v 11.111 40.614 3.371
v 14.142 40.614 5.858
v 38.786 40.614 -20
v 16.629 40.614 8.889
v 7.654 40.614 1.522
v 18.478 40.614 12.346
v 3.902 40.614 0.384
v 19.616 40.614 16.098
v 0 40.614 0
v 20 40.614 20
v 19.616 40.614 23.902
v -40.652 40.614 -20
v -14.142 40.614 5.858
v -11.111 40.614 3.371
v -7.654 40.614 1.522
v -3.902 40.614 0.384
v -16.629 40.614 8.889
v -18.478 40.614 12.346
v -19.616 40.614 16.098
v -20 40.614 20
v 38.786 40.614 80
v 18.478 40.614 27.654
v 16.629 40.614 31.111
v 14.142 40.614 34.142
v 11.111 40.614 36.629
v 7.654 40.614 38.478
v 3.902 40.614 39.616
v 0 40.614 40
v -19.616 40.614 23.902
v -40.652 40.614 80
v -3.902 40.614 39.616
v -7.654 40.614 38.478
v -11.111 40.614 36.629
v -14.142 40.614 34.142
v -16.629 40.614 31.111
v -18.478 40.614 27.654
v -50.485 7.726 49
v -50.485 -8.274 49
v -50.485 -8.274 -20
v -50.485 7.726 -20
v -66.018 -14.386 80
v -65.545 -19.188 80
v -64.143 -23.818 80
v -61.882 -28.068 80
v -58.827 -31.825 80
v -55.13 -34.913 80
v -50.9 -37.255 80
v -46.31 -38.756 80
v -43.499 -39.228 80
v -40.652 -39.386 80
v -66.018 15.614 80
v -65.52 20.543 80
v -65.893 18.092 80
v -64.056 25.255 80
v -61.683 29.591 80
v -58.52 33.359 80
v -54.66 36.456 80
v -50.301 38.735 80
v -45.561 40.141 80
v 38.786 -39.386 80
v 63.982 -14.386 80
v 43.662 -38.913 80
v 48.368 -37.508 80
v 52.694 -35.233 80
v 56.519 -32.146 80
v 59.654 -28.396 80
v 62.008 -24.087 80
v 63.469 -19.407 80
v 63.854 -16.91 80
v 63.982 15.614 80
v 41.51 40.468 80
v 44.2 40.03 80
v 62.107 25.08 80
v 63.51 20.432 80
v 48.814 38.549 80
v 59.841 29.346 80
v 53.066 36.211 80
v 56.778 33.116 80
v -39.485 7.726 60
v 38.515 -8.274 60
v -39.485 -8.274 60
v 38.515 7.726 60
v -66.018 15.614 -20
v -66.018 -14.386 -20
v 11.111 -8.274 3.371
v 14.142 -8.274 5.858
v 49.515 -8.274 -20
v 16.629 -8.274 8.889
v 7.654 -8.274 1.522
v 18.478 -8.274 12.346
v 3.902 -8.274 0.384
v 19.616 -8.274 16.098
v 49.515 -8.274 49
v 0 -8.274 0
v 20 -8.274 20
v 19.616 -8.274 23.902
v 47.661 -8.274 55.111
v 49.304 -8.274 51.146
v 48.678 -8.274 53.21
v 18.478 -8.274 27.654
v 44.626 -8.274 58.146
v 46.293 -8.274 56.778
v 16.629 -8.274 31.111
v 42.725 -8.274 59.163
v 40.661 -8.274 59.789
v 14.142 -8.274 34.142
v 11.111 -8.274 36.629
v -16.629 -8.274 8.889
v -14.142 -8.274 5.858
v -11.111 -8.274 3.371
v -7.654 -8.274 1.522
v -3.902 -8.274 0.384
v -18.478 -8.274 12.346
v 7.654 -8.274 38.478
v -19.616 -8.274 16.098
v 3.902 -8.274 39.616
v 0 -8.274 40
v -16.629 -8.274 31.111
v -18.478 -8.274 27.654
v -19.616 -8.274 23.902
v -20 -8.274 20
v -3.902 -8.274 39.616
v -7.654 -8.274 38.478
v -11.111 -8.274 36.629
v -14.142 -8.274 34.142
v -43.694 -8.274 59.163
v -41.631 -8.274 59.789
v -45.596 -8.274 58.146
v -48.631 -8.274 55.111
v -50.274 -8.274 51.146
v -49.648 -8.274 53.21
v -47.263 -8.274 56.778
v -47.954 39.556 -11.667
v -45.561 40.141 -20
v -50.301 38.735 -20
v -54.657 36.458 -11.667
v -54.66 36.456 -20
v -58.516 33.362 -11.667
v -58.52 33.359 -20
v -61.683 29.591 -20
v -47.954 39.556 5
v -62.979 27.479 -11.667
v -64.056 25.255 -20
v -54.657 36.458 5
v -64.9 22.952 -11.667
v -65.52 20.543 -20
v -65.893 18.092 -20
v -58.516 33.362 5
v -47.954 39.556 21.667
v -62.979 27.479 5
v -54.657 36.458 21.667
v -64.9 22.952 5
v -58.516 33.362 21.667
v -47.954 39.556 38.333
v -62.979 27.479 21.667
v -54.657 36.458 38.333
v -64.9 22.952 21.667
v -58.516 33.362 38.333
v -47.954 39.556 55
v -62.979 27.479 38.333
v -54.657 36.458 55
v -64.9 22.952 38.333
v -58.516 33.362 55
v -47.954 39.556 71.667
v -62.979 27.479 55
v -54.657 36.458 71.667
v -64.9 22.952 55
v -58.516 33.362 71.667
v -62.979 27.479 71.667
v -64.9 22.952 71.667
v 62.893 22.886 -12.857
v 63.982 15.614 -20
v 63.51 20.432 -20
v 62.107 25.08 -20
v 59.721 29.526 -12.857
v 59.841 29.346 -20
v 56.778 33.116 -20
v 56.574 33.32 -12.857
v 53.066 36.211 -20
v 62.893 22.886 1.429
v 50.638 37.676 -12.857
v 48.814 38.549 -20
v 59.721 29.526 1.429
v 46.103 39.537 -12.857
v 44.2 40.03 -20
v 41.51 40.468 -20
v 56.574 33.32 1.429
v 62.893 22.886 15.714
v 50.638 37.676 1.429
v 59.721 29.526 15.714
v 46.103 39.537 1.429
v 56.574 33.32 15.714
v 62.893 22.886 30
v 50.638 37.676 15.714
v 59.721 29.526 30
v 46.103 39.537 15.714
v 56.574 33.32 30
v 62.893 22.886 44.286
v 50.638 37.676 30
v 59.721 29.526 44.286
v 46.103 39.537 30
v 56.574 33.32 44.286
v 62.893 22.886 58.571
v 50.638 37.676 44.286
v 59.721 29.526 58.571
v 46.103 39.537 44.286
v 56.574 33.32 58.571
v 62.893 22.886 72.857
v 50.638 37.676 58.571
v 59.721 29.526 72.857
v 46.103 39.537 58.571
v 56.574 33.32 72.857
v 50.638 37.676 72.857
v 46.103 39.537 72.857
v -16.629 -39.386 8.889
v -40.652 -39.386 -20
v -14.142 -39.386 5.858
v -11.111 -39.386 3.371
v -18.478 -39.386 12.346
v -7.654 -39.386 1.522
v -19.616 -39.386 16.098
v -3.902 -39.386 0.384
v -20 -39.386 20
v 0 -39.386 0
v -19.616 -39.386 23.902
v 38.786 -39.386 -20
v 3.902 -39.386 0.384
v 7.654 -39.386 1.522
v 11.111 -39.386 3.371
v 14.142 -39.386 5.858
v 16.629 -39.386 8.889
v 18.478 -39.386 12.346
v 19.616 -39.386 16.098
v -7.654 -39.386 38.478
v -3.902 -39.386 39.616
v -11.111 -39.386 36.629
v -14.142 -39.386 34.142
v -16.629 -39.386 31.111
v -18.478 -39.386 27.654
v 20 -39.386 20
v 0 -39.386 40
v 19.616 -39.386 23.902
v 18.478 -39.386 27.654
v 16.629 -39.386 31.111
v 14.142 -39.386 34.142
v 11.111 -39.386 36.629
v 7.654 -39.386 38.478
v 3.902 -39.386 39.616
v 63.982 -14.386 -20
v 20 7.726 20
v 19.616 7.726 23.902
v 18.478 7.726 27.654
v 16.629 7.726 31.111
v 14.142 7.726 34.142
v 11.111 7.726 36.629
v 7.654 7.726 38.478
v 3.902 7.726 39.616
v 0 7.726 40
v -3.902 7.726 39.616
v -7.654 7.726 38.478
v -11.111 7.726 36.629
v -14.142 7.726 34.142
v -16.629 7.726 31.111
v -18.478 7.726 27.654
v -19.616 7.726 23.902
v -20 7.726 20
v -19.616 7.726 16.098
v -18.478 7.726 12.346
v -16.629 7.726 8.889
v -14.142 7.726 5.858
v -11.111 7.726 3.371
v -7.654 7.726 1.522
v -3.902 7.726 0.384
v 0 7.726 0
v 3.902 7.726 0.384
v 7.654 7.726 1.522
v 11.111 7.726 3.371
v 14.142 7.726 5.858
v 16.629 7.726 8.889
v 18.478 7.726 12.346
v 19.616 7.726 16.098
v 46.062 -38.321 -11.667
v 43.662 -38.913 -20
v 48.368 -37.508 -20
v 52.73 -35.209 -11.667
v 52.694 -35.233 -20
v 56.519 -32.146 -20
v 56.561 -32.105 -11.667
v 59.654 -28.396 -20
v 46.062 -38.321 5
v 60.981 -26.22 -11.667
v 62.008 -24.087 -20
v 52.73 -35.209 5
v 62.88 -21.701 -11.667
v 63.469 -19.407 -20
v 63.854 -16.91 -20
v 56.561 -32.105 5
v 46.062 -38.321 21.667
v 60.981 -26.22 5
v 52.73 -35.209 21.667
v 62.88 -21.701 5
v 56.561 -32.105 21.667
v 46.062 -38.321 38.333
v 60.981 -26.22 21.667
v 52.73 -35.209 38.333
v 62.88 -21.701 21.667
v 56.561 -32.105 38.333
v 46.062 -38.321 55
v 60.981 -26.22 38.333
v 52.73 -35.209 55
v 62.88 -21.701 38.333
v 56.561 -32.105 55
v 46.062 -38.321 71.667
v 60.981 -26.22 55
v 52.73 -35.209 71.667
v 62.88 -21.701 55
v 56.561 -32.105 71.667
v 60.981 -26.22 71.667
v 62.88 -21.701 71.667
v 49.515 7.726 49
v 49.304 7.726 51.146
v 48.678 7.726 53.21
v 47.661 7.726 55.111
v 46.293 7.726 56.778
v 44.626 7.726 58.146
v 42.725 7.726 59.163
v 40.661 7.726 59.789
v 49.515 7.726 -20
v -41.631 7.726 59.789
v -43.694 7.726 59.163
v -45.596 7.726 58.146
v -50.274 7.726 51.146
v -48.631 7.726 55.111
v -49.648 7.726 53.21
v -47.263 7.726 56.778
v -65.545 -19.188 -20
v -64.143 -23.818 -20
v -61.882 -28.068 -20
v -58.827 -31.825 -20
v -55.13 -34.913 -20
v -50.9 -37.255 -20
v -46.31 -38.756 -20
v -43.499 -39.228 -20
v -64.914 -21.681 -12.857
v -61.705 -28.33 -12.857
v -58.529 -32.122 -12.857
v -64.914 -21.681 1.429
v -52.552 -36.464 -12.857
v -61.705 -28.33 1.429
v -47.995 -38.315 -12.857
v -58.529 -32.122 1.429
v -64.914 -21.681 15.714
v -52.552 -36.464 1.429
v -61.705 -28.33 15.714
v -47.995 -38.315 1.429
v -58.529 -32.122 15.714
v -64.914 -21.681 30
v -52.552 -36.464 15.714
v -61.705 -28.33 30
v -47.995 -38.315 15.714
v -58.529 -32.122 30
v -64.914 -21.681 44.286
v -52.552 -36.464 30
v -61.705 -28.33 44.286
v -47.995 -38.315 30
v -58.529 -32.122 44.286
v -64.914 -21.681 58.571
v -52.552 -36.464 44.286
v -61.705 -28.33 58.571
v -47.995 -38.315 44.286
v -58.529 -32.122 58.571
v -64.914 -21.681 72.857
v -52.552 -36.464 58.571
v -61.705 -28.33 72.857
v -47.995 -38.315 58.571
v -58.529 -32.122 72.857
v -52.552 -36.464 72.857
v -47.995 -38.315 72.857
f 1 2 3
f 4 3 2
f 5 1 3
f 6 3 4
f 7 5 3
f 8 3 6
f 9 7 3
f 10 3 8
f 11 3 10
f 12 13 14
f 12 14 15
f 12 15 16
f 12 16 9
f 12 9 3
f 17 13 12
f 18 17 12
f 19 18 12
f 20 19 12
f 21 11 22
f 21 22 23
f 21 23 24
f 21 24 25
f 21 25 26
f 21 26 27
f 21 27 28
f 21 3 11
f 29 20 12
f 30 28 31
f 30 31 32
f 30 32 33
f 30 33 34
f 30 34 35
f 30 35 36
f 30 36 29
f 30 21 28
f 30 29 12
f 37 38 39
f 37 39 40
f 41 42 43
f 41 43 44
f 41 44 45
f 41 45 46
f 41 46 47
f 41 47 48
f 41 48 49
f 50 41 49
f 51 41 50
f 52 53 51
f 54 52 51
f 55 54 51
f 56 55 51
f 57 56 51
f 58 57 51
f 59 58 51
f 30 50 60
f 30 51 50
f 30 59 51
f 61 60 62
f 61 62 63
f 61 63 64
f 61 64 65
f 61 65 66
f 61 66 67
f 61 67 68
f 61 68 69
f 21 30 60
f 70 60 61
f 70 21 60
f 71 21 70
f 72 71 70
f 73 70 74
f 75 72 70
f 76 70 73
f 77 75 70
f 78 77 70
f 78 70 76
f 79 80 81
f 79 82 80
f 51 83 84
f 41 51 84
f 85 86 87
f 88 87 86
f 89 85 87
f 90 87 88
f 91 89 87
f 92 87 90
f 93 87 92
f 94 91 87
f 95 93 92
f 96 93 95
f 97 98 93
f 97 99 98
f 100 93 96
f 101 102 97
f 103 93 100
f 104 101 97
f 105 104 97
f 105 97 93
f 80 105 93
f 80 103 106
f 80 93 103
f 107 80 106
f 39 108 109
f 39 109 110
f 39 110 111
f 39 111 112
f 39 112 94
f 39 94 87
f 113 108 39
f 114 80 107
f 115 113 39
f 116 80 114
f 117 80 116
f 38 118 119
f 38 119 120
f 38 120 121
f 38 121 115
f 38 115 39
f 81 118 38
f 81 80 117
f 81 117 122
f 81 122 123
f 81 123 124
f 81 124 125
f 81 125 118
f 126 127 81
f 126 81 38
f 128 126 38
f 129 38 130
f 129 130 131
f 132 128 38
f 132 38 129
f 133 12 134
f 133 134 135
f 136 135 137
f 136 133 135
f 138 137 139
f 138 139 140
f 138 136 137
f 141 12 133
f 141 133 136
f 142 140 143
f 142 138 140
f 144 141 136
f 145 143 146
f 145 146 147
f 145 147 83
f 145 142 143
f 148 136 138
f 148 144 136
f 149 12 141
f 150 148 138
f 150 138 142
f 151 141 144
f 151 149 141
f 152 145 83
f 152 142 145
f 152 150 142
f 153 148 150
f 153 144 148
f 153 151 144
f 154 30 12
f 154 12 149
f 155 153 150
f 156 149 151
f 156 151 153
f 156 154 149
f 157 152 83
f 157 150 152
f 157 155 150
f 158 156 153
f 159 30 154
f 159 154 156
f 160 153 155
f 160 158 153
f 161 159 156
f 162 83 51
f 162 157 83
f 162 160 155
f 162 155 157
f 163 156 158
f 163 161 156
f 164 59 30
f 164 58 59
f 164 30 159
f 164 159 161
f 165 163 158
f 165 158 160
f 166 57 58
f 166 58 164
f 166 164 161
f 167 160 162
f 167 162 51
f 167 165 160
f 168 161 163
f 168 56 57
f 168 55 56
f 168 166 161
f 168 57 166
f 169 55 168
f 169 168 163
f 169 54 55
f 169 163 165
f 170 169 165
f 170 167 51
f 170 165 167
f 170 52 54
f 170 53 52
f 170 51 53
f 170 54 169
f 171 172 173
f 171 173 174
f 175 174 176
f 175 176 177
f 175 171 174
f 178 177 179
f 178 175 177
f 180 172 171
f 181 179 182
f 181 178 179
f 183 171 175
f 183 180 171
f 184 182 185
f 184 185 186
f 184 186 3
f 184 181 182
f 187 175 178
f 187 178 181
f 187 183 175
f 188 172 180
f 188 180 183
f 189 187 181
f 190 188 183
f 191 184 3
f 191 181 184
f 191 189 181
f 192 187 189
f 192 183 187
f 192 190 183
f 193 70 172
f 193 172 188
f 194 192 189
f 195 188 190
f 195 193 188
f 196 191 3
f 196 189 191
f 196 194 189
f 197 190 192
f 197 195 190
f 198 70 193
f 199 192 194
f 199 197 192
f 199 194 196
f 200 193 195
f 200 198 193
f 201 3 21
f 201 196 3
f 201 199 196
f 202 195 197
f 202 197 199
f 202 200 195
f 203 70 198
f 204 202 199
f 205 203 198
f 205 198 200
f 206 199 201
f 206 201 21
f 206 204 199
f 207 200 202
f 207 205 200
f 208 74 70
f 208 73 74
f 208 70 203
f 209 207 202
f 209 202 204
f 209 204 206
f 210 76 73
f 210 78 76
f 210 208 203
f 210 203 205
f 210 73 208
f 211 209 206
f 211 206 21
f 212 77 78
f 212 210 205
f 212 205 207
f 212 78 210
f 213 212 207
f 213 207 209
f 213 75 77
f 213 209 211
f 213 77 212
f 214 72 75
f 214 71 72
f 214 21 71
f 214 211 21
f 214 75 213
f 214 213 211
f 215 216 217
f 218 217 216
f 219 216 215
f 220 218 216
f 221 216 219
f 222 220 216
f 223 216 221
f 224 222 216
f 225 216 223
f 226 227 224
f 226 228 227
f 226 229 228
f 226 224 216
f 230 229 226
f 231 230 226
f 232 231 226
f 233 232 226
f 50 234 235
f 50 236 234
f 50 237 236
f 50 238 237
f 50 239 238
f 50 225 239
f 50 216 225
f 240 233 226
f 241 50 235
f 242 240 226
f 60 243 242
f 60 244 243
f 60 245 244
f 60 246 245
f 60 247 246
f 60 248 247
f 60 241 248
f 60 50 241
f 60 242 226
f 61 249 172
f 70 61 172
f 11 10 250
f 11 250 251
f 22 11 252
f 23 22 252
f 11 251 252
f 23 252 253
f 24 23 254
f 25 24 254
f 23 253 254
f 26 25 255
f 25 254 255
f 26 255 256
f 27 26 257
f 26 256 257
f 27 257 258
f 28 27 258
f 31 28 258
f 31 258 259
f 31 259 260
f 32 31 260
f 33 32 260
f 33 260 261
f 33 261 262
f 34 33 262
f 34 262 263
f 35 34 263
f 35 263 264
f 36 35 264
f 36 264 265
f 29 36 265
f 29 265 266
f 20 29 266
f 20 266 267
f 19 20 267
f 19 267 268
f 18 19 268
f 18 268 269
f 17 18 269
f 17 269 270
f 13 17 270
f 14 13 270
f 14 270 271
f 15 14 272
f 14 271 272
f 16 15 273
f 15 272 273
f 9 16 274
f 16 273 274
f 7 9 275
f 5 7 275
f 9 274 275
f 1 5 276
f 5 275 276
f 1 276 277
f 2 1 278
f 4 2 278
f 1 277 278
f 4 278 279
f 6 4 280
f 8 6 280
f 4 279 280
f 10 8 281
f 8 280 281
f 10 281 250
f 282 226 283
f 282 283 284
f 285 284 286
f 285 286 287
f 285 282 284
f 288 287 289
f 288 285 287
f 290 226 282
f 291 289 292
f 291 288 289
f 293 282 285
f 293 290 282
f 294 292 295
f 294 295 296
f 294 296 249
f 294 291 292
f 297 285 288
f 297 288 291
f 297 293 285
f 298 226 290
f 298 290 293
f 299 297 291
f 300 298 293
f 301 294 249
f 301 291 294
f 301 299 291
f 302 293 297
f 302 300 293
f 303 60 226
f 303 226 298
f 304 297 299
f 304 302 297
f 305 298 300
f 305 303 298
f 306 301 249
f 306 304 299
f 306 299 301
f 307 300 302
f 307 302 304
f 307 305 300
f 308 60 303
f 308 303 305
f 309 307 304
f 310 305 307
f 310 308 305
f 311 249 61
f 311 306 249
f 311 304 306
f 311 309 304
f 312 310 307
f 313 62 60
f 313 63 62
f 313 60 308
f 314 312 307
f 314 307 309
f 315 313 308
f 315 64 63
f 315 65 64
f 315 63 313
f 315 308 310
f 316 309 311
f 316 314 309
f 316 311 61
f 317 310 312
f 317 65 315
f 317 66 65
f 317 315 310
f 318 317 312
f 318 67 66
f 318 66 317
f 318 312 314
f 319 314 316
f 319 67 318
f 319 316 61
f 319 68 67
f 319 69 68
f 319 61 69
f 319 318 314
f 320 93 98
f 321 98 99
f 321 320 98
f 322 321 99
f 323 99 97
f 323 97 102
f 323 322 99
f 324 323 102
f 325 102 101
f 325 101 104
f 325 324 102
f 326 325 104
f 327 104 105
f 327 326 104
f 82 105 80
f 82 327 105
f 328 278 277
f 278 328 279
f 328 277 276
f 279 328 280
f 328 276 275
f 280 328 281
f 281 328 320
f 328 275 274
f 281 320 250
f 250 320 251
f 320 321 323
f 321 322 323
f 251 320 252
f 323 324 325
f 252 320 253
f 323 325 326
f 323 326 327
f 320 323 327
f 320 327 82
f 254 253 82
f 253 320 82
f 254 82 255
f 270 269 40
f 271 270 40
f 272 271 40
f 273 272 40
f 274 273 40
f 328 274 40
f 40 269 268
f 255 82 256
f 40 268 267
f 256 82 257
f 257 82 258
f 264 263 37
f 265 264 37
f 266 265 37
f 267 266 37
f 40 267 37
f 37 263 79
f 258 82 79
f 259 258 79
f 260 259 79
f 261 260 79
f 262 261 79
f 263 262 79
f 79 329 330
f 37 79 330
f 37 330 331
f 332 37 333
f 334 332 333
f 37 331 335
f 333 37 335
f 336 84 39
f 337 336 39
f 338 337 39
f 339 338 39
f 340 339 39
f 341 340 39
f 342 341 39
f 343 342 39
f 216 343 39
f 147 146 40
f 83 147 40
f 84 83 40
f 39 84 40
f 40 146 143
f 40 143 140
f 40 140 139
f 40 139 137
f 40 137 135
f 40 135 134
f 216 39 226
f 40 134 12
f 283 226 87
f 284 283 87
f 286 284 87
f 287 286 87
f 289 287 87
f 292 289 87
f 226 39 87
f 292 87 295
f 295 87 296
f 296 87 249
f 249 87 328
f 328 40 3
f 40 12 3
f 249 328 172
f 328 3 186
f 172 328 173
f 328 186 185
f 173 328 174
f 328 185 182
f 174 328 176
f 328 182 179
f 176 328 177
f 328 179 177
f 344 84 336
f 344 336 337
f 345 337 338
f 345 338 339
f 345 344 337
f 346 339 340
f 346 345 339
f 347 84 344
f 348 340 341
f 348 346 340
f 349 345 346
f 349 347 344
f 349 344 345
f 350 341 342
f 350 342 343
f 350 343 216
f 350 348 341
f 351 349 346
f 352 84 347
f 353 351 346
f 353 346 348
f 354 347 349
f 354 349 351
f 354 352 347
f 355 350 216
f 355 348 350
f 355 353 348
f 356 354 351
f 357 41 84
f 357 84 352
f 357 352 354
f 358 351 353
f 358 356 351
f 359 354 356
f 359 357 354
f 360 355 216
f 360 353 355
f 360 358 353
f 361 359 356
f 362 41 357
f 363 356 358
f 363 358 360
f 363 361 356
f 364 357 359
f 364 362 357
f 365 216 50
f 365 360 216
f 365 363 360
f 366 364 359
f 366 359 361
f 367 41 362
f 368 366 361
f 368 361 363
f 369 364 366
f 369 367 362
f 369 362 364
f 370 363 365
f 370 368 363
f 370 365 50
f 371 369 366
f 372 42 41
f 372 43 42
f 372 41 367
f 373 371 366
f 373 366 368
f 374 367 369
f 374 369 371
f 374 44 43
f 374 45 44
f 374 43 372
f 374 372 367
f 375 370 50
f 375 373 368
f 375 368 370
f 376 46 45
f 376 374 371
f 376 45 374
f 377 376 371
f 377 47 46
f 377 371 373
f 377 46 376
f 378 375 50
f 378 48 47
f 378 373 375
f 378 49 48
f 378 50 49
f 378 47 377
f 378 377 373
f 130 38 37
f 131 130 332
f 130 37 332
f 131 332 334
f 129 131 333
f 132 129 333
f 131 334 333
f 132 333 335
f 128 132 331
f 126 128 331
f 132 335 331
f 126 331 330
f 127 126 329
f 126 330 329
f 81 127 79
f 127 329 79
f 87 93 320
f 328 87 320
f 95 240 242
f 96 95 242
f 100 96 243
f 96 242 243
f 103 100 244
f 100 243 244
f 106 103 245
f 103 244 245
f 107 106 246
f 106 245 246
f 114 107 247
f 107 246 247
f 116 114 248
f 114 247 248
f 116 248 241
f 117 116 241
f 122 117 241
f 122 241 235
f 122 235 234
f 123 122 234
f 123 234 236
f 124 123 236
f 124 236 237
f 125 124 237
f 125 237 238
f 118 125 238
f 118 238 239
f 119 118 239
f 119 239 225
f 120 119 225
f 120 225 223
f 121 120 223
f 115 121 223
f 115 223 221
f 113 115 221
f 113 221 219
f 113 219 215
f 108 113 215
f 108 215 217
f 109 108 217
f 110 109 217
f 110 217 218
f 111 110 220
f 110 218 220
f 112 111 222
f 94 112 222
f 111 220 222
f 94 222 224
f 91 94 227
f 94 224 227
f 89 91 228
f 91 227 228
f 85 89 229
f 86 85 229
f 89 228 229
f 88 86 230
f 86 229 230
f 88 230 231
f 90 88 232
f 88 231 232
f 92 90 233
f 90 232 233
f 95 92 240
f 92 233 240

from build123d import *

# Parameters (mm, degrees)
BOSS_EXTRU_1_START      = 80
BOSS_EXTRU_1_DEPTH      = 100
ENL_V_START             = -80
ESQUISSE3_W             = 100
ESQUISSE3_H             = 16
ENL_V_MAT_EXTRU_1_DEPTH = 80
CONG_4_R                = 11
ESQUISSE4_R             = 20
ENL_V_MAT_EXTRU_2_DEPTH = 131.989866835


with BuildPart() as part:
    # Esquisse1 → Boss.-Extru.1 (new body)
    with BuildSketch(Plane.XY.offset(BOSS_EXTRU_1_START)):
        with BuildLine():
            Line((38.785545077, 40.614050057), (-40.651735145, 40.614050057))
            add(Edge.make_bspline(
                [(-40.651735145, 40.614050057), (-42.314401042, 40.614050057), (-43.949970441, 40.454492538), (-46.364281177, 39.985249726), (-47.162496652, 39.790237743), (-48.745517159, 39.321246489), (-49.533460665, 39.045648859), (-51.828661424, 38.115479858), (-53.281442172, 37.355862098), (-55.345438246, 36.008719052), (-56.014108587, 35.524812991), (-57.311227091, 34.484460801), (-57.928932966, 33.936606502), (-59.691288641, 32.213512357), (-60.746535217, 30.959092716), (-62.145716067, 28.915215354), (-62.582595679, 28.203507769), (-63.374918425, 26.755312757), (-63.732785576, 26.015863677), (-64.373256555, 24.506793589), (-64.65585931, 23.737172152), (-65.144921869, 22.167404719), (-65.351725199, 21.365590427), (-65.850986238, 18.923189743), (-66.017764036, 17.277412601), (-66.017764036, 15.614050057)],
                knots=[0, 0, 0, 0, 0.125, 0.125, 0.1875, 0.1875, 0.25, 0.25, 0.375, 0.375, 0.4375, 0.4375, 0.5, 0.5, 0.625, 0.625, 0.6875, 0.6875, 0.75, 0.75, 0.8125, 0.8125, 0.875, 0.875, 1, 1, 1, 1], degree=3))
            Line((-66.017764036, 15.614050057), (-66.017764036, -14.385949943))
            add(Edge.make_bspline(
                [(-66.017764036, -14.385949943), (-66.017764036, -16.048876138), (-65.851094207, -17.683331778), (-65.361702976, -20.094123219), (-65.158373409, -20.890853543), (-64.669502924, -22.47027084), (-64.382985964, -23.253871687), (-63.418861279, -25.531148199), (-62.632909001, -26.969986123), (-61.47342948, -28.670438694), (-61.23260127, -29.005579947), (-60.732801819, -29.665809665), (-60.473222797, -29.991558275), (-59.675187681, -30.943569432), (-59.115575096, -31.547471943), (-57.356561849, -33.269755718), (-56.077742546, -34.299557378), (-54.343422936, -35.435349924), (-53.989857778, -35.654684562), (-53.276724993, -36.073359456), (-52.916218587, -36.273332214), (-51.823086229, -36.845648188), (-50.334662142, -37.535258588), (-48.785246215, -38.079902579), (-47.20487869, -38.550980299), (-46.395575711, -38.750272405), (-43.957668722, -39.226451984), (-42.313993676, -39.385949943), (-40.651735145, -39.385949943)],
                knots=[0, 0, 0, 0, 0.125, 0.125, 0.1875, 0.1875, 0.25, 0.25, 0.375, 0.375, 0.40625, 0.40625, 0.4375, 0.4375, 0.5, 0.5, 0.625, 0.625, 0.65625, 0.65625, 0.6875, 0.6875, 0.75, 0.8125, 0.8125, 0.875, 0.875, 1, 1, 1, 1], degree=3))
            Line((-40.651735145, -39.385949943), (38.785545077, -39.385949943))
            add(Edge.make_bspline(
                [(38.785545077, -39.385949943), (40.442664026, -39.385949943), (42.072477718, -39.225354876), (44.477877986, -38.753201256), (45.273076472, -38.556989578), (46.849967737, -38.085132809), (47.634388323, -37.807976207), (49.917807144, -36.873298226), (51.362544447, -36.110292076), (53.414281907, -34.757655279), (54.079899229, -34.270978942), (55.366402243, -33.228584654), (55.97873177, -32.679974918), (57.725866743, -30.954489737), (58.771668074, -29.698711403), (60.157750527, -27.653150155), (60.589614996, -26.942198814), (61.372344654, -25.496840481), (62.079494348, -24.020824341), (62.637956251, -22.484495371), (63.121147278, -20.91763397), (63.325643893, -20.116192861), (63.817740886, -17.683150497), (63.982235964, -16.043440912), (63.982235964, -14.385949943)],
                knots=[0, 0, 0, 0, 0.125, 0.125, 0.1875, 0.1875, 0.25, 0.25, 0.375, 0.375, 0.4375, 0.4375, 0.5, 0.5, 0.625, 0.625, 0.6875, 0.6875, 0.75, 0.8125, 0.8125, 0.875, 0.875, 1, 1, 1, 1], degree=3))
            Line((63.982235964, -14.385949943), (63.982235964, 15.614050057))
            add(Edge.make_bspline(
                [(63.982235964, 15.614050057), (63.982235964, 17.271310828), (63.817806647, 18.900524173), (63.334809815, 21.304028451), (63.134123418, 22.098426882), (62.65157662, 23.673377539), (62.368548411, 24.455463484), (61.415616974, 26.729252988), (60.63846114, 28.166500735), (59.491466105, 29.865784629), (59.253210251, 30.200733657), (58.758705823, 30.860661599), (58.501710157, 31.186502863), (57.710451504, 32.140097193), (57.155472753, 32.745084226), (55.410698291, 34.47070563), (54.141818247, 35.502843902), (52.420489637, 36.641694741), (52.068783545, 36.862138502), (51.359150828, 37.2830162), (51.00041085, 37.484029901), (49.912631681, 38.059303906), (48.431489045, 38.75242056), (46.889689036, 39.299828689), (45.317129339, 39.773347224), (44.511672713, 39.973796439), (42.081029739, 40.453478808), (40.442443449, 40.614050057), (38.785545077, 40.614050057)],
                knots=[0, 0, 0, 0, 0.125, 0.125, 0.1875, 0.1875, 0.25, 0.25, 0.375, 0.375, 0.40625, 0.40625, 0.4375, 0.4375, 0.5, 0.5, 0.625, 0.625, 0.65625, 0.65625, 0.6875, 0.6875, 0.75, 0.8125, 0.8125, 0.875, 0.875, 1, 1, 1, 1], degree=3))
        make_face()
    extrude(amount=-BOSS_EXTRU_1_DEPTH)

    # Esquisse3 → Enlèv. mat.-Extru.1 (cut)
    with BuildSketch(Plane(origin=(0, 0, -20), x_dir=(-1, 0, 0), z_dir=(0, 0, -1)).offset(ENL_V_START)):
        with Locations((0.484895913, -0.273885368)):
            Rectangle(ESQUISSE3_W, ESQUISSE3_H)
    extrude(amount=ENL_V_MAT_EXTRU_1_DEPTH, mode=Mode.SUBTRACT)

    # Congé4
    cong_4_edges = [part.edges().sort_by_distance(p)[0] for p in [
        (49.515104087, -0.273885368, 60),
        (-50.484895913, -0.273885368, 60),
    ]]
    fillet(cong_4_edges, radius=CONG_4_R)

    # Esquisse4 → Enlèv. mat.-Extru.2 (cut, through all)
    with BuildSketch(Plane.XZ.offset(39.385949943)):
        with Locations((0, 20)):
            Circle(ESQUISSE4_R)
    extrude(amount=-ENL_V_MAT_EXTRU_2_DEPTH, mode=Mode.SUBTRACT)


solid = part.part
